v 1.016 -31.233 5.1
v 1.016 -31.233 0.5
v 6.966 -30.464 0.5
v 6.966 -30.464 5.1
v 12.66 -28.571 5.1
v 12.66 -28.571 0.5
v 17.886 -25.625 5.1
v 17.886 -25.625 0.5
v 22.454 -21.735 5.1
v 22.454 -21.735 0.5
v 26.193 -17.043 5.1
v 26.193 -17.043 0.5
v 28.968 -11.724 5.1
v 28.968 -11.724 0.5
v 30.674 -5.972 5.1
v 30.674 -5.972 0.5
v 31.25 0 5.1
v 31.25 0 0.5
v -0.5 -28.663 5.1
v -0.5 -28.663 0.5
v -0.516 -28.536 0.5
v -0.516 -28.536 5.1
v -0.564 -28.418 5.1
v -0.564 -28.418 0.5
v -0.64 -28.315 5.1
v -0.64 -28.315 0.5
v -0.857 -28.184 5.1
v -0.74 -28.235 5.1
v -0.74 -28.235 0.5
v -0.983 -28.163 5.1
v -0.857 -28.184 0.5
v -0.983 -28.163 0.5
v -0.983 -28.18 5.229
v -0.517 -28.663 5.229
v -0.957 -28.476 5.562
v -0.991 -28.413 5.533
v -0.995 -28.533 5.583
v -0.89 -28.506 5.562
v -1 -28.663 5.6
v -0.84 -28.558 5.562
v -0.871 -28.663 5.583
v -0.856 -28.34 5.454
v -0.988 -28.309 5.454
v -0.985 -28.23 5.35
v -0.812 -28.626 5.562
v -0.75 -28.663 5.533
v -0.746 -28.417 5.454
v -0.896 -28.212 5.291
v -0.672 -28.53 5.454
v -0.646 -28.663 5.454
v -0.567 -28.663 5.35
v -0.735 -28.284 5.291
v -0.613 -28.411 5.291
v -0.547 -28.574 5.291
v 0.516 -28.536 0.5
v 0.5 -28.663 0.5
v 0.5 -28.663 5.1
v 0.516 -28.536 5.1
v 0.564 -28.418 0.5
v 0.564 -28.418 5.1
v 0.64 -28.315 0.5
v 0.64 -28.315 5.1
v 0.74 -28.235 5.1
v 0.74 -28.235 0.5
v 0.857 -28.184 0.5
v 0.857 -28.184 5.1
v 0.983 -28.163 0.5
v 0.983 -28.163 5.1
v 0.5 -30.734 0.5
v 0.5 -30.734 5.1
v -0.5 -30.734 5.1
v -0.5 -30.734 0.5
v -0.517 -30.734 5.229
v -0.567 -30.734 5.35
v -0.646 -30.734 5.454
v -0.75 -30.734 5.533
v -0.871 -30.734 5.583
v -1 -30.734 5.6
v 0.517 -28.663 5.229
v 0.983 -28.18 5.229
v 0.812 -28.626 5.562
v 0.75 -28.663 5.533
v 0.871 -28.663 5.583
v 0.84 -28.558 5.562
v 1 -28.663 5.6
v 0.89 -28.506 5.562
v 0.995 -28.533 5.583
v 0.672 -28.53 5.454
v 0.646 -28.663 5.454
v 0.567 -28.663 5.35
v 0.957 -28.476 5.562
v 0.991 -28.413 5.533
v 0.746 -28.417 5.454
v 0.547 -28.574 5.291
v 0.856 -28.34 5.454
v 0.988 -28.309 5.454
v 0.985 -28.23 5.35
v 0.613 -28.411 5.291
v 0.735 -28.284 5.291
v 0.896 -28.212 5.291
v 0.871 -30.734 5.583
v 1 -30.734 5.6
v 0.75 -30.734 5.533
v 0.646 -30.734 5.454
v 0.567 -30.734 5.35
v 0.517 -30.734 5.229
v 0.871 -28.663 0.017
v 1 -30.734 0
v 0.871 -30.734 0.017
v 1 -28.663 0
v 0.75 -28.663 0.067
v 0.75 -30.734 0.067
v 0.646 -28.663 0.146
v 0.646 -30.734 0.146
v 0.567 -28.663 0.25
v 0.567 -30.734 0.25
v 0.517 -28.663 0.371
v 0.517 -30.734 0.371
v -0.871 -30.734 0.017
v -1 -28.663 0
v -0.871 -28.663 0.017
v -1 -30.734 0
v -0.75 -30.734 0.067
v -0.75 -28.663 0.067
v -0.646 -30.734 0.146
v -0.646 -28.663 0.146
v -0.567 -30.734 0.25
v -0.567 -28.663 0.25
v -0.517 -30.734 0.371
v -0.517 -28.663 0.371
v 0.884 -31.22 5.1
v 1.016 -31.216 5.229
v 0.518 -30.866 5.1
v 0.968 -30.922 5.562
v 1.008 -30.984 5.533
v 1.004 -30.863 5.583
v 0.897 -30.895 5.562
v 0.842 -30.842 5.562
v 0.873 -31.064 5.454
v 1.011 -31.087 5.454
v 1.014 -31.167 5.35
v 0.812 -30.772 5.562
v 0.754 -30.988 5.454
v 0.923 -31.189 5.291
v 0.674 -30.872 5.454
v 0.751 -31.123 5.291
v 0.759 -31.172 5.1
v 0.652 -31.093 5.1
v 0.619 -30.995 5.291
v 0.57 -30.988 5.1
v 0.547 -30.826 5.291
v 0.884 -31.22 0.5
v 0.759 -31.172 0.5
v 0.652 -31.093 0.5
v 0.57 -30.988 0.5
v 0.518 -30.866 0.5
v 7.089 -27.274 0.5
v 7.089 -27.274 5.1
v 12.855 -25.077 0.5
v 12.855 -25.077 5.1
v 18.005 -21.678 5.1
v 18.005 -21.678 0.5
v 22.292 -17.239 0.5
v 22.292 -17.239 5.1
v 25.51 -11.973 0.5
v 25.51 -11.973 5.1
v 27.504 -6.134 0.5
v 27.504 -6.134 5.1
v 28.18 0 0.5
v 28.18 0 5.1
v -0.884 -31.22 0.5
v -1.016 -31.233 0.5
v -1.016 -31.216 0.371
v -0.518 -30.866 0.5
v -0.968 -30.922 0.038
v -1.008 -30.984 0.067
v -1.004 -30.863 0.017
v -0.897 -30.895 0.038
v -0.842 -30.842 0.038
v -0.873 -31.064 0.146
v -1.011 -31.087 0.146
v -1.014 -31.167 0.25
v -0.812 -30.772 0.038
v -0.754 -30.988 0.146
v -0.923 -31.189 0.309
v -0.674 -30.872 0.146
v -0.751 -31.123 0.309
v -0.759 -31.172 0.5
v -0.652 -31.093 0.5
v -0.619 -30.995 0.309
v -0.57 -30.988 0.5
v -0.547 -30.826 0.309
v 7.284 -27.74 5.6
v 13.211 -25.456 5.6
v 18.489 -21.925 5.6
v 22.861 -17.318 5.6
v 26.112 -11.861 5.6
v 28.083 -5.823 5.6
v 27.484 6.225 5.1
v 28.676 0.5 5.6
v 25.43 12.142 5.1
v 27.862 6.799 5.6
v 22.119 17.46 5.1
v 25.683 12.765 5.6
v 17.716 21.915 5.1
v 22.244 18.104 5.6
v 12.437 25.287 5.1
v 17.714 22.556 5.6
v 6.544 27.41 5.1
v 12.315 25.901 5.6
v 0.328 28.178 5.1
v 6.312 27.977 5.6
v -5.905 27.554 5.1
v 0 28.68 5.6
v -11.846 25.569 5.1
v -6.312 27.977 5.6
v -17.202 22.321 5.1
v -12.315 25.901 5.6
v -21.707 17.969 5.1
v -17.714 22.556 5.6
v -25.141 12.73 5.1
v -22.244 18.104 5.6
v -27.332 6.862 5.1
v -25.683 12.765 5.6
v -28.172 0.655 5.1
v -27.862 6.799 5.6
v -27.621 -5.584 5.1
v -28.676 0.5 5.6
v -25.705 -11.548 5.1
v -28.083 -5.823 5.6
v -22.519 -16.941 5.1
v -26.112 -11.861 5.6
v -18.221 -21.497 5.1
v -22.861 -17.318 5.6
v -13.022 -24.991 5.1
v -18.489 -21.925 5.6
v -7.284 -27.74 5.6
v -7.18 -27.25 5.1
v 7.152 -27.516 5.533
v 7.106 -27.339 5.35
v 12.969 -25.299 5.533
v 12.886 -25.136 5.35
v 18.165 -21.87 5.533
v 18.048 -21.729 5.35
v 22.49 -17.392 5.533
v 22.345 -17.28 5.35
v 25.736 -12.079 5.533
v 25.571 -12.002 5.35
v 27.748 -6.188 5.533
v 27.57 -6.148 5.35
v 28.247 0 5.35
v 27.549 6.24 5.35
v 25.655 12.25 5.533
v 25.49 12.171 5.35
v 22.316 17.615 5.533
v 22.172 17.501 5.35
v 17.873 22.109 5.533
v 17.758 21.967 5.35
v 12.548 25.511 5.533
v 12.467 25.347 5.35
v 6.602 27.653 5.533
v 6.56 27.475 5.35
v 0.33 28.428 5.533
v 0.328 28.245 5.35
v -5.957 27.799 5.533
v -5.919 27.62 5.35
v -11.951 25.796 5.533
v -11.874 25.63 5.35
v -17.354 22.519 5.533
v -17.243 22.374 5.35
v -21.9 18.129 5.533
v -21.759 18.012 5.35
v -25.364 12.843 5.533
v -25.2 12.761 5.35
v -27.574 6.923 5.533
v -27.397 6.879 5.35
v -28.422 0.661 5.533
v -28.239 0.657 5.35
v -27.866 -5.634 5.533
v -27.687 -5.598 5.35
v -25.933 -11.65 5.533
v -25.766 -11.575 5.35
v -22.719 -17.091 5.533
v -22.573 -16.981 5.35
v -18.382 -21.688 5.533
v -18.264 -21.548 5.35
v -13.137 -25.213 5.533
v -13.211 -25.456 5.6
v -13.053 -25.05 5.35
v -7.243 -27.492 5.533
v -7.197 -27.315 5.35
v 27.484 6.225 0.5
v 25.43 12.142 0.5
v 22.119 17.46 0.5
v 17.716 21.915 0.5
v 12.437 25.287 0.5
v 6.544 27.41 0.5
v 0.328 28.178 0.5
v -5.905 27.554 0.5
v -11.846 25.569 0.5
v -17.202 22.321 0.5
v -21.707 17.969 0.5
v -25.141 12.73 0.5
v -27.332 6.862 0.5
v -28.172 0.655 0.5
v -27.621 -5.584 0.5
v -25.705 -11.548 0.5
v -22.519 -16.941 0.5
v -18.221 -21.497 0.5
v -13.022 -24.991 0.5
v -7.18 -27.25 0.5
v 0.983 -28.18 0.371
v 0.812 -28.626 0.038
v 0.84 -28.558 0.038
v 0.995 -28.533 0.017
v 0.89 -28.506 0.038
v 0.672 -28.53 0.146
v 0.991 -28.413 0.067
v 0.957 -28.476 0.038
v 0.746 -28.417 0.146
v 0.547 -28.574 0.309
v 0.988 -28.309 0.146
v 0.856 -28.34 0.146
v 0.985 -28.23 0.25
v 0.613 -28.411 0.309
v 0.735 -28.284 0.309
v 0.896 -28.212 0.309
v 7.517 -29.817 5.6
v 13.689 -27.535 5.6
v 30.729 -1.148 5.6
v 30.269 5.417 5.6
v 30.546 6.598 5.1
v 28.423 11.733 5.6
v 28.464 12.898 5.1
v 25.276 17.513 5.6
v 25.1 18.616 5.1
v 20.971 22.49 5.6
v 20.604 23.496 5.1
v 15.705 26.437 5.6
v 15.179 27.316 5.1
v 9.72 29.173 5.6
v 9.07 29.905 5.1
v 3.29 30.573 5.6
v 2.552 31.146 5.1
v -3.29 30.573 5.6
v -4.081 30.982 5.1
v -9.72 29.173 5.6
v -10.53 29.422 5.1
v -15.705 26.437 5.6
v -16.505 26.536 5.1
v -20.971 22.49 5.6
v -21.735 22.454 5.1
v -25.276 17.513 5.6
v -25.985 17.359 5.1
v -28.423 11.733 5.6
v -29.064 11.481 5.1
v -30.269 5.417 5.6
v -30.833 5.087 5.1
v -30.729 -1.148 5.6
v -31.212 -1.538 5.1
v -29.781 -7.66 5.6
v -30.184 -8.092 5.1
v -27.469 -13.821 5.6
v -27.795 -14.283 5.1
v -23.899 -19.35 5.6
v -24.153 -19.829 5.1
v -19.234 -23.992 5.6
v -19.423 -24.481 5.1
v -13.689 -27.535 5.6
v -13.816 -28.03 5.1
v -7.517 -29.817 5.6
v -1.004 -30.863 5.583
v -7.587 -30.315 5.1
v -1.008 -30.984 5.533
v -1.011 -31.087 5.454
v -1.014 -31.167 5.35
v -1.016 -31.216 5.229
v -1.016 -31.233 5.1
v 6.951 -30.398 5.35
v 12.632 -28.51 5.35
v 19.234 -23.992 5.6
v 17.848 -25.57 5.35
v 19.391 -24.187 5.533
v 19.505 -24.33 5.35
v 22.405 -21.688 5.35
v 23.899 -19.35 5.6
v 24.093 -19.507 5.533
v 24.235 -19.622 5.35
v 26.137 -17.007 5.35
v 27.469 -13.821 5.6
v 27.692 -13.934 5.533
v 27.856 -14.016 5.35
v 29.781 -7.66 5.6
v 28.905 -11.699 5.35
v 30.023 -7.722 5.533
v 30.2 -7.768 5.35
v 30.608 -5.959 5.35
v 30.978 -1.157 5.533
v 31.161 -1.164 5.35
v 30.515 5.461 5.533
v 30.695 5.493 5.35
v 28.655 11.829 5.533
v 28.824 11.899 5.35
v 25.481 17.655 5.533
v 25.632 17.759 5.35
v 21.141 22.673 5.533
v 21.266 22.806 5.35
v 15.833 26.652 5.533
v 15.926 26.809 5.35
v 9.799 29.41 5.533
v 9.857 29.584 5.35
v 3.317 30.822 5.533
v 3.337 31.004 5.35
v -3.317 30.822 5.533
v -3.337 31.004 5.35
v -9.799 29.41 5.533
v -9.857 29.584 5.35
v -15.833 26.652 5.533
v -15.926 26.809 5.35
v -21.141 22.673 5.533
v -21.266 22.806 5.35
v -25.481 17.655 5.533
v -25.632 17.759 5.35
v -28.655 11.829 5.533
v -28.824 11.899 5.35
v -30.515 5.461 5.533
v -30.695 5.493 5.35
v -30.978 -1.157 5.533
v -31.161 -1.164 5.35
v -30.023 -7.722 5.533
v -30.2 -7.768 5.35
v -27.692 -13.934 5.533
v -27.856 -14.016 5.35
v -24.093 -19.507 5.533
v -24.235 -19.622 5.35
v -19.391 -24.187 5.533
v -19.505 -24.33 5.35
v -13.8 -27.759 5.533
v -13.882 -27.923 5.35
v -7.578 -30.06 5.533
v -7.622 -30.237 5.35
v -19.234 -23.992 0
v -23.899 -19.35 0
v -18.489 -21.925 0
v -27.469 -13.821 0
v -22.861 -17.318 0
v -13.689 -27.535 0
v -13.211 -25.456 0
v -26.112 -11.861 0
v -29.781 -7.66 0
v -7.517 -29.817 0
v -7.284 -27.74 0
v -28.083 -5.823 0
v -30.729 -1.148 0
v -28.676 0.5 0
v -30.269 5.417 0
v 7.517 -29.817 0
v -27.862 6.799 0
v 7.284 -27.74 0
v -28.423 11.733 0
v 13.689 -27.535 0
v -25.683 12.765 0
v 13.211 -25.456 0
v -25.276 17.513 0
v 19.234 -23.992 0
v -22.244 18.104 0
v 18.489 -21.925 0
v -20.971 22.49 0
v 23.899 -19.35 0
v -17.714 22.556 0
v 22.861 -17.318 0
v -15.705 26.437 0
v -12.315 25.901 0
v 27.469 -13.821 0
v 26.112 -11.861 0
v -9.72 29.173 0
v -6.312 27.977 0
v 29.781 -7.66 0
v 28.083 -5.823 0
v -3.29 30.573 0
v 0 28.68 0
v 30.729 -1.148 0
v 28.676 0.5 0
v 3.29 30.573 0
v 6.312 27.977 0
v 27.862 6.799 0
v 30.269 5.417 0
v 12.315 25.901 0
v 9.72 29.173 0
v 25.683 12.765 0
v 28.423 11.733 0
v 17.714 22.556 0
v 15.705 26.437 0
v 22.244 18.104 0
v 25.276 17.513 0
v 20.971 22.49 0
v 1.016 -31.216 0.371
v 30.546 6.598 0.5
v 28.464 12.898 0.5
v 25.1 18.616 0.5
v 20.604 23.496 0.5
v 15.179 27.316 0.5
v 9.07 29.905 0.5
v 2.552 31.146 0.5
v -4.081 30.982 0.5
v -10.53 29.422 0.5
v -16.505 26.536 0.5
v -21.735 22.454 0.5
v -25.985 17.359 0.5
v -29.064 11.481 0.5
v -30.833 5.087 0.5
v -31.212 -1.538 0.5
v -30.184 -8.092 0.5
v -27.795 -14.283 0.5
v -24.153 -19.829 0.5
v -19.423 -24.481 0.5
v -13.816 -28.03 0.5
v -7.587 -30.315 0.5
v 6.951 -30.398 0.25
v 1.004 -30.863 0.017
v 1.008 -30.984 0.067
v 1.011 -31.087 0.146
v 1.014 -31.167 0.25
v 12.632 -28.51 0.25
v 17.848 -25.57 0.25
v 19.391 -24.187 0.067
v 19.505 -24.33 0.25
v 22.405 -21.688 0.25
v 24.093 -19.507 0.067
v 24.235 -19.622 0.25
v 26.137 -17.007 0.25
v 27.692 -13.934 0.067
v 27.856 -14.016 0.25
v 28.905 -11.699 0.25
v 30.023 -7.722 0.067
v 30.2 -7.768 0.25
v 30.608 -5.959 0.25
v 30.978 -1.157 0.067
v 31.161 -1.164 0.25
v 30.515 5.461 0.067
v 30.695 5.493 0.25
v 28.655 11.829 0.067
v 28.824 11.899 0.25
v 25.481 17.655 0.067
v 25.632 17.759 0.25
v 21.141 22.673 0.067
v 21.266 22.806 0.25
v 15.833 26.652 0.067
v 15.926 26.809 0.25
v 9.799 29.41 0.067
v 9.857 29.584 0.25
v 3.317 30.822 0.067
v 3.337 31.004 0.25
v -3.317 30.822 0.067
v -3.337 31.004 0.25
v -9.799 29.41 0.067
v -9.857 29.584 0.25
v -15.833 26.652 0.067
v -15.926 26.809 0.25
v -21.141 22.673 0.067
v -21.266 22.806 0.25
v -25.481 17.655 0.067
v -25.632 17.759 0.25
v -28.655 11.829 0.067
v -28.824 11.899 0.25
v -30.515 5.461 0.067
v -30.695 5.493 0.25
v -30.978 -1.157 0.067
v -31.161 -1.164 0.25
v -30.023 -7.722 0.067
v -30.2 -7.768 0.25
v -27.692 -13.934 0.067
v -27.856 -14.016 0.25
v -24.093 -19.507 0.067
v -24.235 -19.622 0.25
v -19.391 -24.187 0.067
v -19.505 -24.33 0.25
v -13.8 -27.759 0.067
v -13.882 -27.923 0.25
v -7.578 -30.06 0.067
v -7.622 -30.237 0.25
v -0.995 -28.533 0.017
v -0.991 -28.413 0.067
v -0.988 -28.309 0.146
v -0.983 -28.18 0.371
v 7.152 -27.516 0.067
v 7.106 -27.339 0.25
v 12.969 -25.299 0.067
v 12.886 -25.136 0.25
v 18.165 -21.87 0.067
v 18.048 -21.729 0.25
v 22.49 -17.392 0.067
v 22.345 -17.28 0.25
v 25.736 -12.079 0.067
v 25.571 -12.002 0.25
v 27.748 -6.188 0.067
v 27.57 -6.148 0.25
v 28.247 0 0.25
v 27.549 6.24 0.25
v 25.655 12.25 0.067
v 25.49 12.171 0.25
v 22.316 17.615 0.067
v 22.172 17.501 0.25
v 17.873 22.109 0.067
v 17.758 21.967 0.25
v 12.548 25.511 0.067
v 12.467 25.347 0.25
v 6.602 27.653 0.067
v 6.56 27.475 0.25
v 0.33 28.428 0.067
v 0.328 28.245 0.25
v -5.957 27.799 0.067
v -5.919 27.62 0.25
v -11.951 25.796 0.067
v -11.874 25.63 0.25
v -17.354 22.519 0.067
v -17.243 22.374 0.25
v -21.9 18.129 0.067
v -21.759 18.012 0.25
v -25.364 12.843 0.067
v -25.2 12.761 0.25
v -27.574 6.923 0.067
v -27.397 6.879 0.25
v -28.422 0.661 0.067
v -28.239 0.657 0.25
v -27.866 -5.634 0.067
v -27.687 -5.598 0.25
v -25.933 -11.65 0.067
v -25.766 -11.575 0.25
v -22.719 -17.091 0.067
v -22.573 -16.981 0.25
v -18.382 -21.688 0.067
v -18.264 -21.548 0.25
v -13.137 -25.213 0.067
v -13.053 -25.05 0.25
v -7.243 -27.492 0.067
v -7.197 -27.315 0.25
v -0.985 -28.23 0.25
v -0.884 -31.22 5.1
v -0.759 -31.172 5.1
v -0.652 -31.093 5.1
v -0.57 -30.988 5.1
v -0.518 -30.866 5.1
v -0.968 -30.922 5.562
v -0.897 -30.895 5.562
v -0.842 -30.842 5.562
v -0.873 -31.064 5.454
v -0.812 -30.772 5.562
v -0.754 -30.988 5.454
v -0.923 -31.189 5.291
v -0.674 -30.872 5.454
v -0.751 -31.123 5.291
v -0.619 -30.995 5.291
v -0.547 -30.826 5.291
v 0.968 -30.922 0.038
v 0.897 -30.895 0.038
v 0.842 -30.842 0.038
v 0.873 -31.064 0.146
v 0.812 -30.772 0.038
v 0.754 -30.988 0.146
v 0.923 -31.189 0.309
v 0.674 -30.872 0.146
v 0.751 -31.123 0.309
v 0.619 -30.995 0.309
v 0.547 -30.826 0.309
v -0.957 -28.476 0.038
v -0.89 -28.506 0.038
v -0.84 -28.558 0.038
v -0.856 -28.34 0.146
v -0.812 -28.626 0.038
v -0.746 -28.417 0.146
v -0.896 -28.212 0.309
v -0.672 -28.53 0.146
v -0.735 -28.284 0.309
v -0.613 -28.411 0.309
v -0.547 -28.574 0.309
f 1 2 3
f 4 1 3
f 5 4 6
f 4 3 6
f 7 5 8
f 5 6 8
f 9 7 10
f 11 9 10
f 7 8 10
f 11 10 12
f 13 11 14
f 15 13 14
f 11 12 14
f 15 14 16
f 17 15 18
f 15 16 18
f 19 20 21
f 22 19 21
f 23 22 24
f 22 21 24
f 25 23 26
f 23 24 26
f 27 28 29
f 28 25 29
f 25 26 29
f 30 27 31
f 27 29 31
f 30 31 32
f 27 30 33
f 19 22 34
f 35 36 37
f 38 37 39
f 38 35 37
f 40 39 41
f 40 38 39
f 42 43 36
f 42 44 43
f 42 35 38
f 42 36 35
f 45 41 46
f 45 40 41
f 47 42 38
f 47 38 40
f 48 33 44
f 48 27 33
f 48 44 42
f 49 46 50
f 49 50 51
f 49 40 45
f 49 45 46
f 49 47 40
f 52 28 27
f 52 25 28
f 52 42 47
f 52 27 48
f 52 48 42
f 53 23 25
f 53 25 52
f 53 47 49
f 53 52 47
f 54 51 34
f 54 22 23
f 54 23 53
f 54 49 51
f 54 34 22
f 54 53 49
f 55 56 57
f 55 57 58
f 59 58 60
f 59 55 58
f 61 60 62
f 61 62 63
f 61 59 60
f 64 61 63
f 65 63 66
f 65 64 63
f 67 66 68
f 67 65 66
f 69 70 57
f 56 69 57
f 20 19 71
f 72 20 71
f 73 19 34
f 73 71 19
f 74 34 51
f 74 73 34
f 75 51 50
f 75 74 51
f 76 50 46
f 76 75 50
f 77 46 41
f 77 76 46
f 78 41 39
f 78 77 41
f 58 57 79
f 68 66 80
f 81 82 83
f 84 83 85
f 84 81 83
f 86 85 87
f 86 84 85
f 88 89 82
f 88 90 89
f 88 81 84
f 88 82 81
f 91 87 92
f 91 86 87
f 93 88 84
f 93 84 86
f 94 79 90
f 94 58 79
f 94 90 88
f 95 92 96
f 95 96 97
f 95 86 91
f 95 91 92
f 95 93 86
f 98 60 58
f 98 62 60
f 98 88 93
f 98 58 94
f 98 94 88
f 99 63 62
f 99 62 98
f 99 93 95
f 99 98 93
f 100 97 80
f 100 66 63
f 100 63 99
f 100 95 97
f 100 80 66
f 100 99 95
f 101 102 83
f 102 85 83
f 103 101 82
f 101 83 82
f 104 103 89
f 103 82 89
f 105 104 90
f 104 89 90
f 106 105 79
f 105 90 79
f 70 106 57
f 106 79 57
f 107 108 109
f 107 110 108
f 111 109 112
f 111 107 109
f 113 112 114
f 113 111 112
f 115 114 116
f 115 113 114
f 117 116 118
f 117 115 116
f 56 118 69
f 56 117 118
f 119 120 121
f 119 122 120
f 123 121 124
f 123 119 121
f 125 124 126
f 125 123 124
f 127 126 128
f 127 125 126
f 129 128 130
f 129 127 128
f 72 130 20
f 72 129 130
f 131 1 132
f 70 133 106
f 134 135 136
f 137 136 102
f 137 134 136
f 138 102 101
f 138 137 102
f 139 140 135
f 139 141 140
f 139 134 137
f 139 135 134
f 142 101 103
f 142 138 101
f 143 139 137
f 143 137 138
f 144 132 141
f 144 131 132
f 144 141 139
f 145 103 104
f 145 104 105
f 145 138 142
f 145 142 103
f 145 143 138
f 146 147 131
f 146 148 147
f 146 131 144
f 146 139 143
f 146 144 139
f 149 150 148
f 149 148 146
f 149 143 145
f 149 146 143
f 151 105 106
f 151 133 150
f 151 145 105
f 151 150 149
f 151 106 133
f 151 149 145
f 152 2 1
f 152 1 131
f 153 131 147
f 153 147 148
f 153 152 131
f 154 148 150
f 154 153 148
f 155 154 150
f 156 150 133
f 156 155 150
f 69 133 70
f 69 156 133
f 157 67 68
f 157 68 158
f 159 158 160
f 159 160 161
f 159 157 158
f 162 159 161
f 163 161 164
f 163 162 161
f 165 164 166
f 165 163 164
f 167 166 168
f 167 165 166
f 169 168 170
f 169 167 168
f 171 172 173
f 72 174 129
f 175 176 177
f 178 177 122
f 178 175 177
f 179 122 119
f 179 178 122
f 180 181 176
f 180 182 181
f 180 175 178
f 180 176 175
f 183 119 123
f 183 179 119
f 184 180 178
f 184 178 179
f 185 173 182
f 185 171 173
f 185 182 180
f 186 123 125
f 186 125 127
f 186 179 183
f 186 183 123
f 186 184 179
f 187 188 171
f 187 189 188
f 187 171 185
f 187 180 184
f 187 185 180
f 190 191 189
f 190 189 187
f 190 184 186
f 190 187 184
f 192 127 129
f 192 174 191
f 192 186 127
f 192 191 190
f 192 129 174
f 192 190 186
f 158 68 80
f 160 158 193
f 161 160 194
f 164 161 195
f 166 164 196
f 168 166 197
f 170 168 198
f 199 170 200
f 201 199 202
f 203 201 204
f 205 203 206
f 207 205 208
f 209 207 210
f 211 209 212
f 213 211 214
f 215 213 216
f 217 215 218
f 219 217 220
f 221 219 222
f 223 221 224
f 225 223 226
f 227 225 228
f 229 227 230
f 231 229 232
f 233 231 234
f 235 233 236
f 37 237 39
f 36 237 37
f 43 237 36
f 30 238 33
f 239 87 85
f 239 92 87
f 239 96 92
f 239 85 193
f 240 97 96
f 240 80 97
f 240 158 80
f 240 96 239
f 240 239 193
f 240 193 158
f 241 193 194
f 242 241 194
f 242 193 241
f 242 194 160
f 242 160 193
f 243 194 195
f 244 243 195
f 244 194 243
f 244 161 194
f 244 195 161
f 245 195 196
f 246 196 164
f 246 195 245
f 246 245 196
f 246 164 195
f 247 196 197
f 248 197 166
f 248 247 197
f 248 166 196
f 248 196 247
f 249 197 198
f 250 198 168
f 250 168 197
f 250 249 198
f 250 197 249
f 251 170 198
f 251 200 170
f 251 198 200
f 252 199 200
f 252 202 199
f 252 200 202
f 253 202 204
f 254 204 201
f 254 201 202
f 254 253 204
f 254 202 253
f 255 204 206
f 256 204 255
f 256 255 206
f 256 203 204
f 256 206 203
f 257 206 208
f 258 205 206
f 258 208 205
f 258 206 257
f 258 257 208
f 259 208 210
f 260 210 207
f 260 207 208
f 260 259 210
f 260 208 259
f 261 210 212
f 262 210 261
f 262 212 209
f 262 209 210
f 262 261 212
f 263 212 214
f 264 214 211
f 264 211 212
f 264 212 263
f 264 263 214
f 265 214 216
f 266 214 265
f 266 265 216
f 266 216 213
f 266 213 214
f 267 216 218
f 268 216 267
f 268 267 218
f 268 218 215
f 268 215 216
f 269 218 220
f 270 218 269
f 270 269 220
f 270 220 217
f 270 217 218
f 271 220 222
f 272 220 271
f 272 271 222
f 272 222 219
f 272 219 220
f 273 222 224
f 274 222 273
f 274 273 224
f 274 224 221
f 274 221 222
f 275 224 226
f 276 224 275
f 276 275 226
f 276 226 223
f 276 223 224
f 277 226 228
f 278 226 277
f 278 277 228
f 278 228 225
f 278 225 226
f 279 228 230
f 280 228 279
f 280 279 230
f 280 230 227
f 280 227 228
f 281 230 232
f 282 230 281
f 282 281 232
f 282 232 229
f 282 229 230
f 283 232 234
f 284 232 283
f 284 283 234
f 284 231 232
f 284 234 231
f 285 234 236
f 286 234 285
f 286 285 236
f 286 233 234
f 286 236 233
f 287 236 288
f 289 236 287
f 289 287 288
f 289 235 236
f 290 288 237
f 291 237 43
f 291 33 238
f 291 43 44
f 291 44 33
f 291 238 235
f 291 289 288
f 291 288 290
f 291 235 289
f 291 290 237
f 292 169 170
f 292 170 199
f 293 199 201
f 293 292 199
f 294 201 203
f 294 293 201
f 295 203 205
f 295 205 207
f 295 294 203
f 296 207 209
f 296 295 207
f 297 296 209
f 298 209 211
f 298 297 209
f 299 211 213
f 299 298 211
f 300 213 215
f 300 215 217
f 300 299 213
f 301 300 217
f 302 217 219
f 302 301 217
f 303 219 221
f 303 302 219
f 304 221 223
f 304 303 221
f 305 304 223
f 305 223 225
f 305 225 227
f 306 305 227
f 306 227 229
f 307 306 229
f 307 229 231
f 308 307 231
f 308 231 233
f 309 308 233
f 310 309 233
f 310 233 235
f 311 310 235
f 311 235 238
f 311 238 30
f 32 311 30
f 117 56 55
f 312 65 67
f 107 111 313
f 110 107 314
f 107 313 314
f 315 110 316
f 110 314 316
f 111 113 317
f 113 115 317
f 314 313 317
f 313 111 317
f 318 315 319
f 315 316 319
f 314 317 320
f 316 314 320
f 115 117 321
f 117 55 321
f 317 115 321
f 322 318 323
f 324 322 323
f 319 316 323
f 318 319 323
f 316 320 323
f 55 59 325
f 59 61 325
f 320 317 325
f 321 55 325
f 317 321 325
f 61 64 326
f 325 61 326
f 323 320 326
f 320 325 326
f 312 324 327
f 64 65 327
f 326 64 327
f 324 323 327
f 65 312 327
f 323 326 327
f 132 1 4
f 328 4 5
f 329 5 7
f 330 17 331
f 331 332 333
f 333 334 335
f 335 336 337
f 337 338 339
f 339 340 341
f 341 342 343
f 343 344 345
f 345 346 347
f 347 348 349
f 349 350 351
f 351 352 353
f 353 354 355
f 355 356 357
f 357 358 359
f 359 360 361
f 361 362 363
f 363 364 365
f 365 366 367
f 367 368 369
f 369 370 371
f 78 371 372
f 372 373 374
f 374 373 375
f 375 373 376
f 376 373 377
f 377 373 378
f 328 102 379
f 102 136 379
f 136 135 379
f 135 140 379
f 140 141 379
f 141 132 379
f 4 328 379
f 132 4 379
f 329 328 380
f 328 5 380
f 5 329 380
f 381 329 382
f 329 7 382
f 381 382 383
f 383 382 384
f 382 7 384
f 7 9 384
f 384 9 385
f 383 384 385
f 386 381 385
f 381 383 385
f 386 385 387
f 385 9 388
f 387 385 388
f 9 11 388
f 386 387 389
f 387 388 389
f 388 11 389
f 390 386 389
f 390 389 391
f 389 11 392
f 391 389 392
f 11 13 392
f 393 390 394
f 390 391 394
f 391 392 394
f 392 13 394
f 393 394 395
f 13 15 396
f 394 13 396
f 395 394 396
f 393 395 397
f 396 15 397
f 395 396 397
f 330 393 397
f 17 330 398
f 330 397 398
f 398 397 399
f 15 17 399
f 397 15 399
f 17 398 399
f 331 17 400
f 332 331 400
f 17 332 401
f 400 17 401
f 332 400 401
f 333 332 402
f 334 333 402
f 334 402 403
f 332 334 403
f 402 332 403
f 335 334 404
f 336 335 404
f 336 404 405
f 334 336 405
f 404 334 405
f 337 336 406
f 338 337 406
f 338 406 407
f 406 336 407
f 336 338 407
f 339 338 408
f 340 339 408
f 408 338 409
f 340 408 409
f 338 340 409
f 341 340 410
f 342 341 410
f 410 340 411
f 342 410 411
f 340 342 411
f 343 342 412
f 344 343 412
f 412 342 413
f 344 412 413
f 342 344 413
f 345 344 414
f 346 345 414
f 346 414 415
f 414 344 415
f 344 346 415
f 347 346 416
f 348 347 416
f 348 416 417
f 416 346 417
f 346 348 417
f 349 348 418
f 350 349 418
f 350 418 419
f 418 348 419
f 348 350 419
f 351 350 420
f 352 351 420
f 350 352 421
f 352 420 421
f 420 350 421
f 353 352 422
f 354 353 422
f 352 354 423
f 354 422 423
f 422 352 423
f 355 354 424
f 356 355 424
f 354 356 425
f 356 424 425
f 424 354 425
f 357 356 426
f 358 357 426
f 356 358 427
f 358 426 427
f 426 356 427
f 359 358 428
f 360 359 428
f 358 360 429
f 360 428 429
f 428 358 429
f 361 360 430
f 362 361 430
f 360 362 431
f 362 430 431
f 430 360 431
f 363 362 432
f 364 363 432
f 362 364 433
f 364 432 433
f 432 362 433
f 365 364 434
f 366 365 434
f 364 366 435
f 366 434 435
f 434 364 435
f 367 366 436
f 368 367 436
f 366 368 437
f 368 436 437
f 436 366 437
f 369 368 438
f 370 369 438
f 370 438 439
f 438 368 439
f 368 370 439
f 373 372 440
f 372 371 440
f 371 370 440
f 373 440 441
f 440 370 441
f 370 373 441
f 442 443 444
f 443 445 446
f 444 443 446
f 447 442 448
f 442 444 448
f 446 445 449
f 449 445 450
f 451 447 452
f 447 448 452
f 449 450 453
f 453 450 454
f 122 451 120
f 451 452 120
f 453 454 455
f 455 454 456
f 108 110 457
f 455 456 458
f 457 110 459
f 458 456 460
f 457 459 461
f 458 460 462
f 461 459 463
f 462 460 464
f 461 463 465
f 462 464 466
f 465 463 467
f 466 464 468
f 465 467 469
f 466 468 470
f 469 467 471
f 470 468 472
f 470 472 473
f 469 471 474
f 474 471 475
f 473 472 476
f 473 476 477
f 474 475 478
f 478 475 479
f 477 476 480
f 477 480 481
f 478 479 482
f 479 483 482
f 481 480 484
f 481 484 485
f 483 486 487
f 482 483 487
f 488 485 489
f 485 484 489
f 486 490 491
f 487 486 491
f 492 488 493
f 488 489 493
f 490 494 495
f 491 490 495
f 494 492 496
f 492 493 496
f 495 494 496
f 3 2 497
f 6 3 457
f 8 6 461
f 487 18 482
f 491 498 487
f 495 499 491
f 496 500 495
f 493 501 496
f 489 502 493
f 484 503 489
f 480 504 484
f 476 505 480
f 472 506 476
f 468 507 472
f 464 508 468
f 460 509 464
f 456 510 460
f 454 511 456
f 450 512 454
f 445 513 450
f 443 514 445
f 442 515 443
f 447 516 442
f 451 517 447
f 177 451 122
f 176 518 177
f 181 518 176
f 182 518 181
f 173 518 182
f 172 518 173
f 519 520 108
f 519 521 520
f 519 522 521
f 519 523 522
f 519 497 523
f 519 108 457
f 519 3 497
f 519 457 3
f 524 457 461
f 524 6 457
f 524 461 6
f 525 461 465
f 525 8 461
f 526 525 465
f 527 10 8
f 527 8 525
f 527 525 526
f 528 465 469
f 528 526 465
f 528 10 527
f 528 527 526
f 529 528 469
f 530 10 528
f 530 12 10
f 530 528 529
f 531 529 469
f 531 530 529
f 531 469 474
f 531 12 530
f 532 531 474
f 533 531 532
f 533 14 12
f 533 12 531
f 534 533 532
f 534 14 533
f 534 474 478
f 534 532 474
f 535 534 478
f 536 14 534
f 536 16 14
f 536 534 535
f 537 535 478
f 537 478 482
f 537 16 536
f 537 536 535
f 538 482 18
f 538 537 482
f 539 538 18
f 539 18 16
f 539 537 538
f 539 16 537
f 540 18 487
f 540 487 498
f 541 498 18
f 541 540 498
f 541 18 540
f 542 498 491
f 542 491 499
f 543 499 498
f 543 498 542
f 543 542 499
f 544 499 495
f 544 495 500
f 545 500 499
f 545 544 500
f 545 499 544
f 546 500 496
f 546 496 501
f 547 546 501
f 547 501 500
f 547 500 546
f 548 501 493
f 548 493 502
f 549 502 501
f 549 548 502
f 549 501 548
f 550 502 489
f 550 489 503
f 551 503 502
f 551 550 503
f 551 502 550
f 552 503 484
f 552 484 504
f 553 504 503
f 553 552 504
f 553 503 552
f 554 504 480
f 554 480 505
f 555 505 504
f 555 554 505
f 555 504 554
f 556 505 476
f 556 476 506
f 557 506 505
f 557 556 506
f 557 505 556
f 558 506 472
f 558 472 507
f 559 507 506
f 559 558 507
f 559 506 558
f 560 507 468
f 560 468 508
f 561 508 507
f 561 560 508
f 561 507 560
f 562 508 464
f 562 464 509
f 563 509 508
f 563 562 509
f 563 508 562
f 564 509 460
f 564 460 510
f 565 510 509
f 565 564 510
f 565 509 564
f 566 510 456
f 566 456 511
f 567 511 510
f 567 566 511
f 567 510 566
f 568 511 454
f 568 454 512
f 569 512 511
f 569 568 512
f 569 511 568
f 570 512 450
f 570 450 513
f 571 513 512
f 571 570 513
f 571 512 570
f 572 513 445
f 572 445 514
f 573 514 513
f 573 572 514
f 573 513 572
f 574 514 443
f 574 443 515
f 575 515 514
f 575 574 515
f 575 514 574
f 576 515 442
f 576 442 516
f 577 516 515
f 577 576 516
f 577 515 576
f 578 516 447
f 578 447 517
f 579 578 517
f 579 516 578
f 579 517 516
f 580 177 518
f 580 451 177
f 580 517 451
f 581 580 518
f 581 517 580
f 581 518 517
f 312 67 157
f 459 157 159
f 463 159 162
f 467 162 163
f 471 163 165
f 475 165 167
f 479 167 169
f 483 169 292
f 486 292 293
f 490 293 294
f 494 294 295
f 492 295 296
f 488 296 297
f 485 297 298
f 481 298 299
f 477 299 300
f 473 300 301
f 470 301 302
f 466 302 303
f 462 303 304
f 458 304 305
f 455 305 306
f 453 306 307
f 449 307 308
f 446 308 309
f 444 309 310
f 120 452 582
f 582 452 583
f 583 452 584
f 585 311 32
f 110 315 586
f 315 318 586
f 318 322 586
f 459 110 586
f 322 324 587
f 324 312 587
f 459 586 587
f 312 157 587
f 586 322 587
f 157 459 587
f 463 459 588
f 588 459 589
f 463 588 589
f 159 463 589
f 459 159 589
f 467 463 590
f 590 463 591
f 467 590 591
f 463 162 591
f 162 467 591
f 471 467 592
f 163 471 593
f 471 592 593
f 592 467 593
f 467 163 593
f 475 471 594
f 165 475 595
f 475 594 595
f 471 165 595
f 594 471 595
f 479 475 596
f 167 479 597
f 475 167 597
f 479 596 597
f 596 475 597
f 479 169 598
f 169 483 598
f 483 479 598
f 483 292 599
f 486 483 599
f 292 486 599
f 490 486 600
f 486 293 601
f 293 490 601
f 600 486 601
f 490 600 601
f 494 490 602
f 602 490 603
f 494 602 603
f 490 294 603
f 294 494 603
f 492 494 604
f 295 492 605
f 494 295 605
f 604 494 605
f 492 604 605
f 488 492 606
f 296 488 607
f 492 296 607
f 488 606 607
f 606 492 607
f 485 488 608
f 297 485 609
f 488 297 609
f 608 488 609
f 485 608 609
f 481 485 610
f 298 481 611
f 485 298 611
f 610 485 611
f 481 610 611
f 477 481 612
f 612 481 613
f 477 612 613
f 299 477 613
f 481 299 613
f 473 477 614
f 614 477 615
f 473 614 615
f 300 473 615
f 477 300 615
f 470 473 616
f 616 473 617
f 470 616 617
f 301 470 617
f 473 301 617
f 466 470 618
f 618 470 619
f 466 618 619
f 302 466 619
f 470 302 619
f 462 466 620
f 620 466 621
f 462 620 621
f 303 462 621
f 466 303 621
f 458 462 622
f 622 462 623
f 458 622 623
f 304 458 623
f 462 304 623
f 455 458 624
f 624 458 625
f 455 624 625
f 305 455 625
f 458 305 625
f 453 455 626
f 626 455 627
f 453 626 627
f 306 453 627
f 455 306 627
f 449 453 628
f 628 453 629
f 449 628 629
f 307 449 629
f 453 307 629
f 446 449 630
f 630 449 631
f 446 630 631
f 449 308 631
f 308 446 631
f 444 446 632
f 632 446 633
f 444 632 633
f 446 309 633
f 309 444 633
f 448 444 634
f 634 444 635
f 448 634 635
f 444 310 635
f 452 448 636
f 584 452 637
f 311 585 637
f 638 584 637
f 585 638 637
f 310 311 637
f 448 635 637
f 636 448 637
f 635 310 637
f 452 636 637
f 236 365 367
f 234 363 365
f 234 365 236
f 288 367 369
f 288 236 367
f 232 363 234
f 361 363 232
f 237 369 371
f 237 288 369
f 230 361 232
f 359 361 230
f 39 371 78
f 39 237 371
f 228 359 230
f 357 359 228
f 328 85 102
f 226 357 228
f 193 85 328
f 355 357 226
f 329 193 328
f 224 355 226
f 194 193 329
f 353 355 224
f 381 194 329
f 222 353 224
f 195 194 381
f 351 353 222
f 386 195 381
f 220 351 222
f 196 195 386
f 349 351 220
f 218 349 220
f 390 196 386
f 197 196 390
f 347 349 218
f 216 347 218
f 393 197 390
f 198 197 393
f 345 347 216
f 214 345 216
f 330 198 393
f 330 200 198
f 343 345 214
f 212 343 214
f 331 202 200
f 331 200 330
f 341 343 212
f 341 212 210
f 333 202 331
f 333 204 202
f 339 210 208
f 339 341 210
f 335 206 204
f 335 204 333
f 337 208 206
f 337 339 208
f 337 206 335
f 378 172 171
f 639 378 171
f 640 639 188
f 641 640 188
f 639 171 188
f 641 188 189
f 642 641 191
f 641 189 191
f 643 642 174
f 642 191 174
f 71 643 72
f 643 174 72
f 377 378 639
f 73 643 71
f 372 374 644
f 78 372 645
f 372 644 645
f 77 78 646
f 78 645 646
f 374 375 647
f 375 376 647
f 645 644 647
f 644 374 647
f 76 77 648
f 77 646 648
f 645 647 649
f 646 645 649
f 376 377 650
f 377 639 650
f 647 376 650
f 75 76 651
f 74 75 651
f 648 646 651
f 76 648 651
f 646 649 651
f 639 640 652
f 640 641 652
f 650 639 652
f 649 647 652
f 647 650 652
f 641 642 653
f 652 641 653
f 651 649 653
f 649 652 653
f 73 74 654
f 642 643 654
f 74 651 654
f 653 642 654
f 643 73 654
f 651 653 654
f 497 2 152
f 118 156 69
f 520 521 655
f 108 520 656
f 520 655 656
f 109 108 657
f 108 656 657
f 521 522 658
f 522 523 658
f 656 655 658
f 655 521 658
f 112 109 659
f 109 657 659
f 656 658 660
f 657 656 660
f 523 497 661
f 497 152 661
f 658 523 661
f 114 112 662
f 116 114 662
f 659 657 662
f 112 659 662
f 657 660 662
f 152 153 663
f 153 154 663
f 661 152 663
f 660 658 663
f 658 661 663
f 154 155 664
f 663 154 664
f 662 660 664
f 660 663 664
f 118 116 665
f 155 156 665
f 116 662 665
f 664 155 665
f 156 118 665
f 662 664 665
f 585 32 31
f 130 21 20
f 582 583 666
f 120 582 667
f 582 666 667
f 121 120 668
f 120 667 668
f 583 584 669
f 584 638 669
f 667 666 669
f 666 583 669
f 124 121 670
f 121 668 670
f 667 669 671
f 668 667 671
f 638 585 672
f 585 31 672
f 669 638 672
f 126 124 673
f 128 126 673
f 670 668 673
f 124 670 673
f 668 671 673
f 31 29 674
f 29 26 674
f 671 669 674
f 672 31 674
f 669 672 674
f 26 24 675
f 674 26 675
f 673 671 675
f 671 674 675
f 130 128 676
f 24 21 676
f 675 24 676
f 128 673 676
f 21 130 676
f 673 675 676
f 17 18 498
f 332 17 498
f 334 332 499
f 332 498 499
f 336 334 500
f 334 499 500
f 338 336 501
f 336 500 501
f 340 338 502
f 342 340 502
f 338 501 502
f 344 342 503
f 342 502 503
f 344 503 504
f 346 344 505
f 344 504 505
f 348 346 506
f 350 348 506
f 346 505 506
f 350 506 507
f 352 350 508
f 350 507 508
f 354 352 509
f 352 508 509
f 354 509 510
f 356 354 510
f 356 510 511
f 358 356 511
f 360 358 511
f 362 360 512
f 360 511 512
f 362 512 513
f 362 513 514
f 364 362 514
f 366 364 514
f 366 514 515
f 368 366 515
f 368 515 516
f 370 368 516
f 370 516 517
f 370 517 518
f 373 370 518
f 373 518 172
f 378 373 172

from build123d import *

# Parameters (mm, degrees)
F0_R     = 31.25
F0_R_2   = 28.18
F1_DEPTH = 5.6
F3_DEPTH = 25
F4_R     = 0.5


with BuildPart() as f1:
    # F0 (on Top) → F1 (new body)
    with BuildSketch(Plane.XY):
        Circle(F0_R)
        Circle(F0_R_2, mode=Mode.SUBTRACT)
    extrude(amount=F1_DEPTH)

    # F2 (on face) → F3 (cut)
    with BuildSketch(Plane.XY.offset(5.6)):
        with BuildLine():
            ThreePointArc((0.5, -28.1755638808), (0, -28.18), (-0.5, -28.1755638808))
            Line((-0.5, -28.1755638808), (-0.5, -31.245999744))
            ThreePointArc((-0.5, -31.245999744), (0, -31.25), (0.5, -31.245999744))
            Line((0.5, -31.245999744), (0.5, -28.1755638808))
        make_face()
    extrude(amount=-F3_DEPTH, mode=Mode.SUBTRACT)

    # F4
    f4_edges = [f1.edges().sort_by_distance(p)[0] for p in [
        (-0.5, -31.246, 2.8),
        (-0.5, -28.175564, 2.8),
        (0.5, -31.246, 2.8),
        (0.5, -28.175564, 2.8),
        (22.273162, -21.919597, 5.6),
        (0.5, -29.710782, 5.6),
        (20.102269, -19.748701, 5.6),
        (-19.748701, 20.102269, 5.6),
        (-0.5, -29.710782, 5.6),
        (-21.919597, 22.273162, 5.6),
        (22.273162, -21.919597, 0),
        (0.5, -29.710782, 0),
        (20.102269, -19.748701, 0),
        (-19.748701, 20.102269, 0),
        (-0.5, -29.710782, 0),
        (-21.919597, 22.273162, 0),
    ]]
    fillet(f4_edges, radius=F4_R)


solid = f1.part
